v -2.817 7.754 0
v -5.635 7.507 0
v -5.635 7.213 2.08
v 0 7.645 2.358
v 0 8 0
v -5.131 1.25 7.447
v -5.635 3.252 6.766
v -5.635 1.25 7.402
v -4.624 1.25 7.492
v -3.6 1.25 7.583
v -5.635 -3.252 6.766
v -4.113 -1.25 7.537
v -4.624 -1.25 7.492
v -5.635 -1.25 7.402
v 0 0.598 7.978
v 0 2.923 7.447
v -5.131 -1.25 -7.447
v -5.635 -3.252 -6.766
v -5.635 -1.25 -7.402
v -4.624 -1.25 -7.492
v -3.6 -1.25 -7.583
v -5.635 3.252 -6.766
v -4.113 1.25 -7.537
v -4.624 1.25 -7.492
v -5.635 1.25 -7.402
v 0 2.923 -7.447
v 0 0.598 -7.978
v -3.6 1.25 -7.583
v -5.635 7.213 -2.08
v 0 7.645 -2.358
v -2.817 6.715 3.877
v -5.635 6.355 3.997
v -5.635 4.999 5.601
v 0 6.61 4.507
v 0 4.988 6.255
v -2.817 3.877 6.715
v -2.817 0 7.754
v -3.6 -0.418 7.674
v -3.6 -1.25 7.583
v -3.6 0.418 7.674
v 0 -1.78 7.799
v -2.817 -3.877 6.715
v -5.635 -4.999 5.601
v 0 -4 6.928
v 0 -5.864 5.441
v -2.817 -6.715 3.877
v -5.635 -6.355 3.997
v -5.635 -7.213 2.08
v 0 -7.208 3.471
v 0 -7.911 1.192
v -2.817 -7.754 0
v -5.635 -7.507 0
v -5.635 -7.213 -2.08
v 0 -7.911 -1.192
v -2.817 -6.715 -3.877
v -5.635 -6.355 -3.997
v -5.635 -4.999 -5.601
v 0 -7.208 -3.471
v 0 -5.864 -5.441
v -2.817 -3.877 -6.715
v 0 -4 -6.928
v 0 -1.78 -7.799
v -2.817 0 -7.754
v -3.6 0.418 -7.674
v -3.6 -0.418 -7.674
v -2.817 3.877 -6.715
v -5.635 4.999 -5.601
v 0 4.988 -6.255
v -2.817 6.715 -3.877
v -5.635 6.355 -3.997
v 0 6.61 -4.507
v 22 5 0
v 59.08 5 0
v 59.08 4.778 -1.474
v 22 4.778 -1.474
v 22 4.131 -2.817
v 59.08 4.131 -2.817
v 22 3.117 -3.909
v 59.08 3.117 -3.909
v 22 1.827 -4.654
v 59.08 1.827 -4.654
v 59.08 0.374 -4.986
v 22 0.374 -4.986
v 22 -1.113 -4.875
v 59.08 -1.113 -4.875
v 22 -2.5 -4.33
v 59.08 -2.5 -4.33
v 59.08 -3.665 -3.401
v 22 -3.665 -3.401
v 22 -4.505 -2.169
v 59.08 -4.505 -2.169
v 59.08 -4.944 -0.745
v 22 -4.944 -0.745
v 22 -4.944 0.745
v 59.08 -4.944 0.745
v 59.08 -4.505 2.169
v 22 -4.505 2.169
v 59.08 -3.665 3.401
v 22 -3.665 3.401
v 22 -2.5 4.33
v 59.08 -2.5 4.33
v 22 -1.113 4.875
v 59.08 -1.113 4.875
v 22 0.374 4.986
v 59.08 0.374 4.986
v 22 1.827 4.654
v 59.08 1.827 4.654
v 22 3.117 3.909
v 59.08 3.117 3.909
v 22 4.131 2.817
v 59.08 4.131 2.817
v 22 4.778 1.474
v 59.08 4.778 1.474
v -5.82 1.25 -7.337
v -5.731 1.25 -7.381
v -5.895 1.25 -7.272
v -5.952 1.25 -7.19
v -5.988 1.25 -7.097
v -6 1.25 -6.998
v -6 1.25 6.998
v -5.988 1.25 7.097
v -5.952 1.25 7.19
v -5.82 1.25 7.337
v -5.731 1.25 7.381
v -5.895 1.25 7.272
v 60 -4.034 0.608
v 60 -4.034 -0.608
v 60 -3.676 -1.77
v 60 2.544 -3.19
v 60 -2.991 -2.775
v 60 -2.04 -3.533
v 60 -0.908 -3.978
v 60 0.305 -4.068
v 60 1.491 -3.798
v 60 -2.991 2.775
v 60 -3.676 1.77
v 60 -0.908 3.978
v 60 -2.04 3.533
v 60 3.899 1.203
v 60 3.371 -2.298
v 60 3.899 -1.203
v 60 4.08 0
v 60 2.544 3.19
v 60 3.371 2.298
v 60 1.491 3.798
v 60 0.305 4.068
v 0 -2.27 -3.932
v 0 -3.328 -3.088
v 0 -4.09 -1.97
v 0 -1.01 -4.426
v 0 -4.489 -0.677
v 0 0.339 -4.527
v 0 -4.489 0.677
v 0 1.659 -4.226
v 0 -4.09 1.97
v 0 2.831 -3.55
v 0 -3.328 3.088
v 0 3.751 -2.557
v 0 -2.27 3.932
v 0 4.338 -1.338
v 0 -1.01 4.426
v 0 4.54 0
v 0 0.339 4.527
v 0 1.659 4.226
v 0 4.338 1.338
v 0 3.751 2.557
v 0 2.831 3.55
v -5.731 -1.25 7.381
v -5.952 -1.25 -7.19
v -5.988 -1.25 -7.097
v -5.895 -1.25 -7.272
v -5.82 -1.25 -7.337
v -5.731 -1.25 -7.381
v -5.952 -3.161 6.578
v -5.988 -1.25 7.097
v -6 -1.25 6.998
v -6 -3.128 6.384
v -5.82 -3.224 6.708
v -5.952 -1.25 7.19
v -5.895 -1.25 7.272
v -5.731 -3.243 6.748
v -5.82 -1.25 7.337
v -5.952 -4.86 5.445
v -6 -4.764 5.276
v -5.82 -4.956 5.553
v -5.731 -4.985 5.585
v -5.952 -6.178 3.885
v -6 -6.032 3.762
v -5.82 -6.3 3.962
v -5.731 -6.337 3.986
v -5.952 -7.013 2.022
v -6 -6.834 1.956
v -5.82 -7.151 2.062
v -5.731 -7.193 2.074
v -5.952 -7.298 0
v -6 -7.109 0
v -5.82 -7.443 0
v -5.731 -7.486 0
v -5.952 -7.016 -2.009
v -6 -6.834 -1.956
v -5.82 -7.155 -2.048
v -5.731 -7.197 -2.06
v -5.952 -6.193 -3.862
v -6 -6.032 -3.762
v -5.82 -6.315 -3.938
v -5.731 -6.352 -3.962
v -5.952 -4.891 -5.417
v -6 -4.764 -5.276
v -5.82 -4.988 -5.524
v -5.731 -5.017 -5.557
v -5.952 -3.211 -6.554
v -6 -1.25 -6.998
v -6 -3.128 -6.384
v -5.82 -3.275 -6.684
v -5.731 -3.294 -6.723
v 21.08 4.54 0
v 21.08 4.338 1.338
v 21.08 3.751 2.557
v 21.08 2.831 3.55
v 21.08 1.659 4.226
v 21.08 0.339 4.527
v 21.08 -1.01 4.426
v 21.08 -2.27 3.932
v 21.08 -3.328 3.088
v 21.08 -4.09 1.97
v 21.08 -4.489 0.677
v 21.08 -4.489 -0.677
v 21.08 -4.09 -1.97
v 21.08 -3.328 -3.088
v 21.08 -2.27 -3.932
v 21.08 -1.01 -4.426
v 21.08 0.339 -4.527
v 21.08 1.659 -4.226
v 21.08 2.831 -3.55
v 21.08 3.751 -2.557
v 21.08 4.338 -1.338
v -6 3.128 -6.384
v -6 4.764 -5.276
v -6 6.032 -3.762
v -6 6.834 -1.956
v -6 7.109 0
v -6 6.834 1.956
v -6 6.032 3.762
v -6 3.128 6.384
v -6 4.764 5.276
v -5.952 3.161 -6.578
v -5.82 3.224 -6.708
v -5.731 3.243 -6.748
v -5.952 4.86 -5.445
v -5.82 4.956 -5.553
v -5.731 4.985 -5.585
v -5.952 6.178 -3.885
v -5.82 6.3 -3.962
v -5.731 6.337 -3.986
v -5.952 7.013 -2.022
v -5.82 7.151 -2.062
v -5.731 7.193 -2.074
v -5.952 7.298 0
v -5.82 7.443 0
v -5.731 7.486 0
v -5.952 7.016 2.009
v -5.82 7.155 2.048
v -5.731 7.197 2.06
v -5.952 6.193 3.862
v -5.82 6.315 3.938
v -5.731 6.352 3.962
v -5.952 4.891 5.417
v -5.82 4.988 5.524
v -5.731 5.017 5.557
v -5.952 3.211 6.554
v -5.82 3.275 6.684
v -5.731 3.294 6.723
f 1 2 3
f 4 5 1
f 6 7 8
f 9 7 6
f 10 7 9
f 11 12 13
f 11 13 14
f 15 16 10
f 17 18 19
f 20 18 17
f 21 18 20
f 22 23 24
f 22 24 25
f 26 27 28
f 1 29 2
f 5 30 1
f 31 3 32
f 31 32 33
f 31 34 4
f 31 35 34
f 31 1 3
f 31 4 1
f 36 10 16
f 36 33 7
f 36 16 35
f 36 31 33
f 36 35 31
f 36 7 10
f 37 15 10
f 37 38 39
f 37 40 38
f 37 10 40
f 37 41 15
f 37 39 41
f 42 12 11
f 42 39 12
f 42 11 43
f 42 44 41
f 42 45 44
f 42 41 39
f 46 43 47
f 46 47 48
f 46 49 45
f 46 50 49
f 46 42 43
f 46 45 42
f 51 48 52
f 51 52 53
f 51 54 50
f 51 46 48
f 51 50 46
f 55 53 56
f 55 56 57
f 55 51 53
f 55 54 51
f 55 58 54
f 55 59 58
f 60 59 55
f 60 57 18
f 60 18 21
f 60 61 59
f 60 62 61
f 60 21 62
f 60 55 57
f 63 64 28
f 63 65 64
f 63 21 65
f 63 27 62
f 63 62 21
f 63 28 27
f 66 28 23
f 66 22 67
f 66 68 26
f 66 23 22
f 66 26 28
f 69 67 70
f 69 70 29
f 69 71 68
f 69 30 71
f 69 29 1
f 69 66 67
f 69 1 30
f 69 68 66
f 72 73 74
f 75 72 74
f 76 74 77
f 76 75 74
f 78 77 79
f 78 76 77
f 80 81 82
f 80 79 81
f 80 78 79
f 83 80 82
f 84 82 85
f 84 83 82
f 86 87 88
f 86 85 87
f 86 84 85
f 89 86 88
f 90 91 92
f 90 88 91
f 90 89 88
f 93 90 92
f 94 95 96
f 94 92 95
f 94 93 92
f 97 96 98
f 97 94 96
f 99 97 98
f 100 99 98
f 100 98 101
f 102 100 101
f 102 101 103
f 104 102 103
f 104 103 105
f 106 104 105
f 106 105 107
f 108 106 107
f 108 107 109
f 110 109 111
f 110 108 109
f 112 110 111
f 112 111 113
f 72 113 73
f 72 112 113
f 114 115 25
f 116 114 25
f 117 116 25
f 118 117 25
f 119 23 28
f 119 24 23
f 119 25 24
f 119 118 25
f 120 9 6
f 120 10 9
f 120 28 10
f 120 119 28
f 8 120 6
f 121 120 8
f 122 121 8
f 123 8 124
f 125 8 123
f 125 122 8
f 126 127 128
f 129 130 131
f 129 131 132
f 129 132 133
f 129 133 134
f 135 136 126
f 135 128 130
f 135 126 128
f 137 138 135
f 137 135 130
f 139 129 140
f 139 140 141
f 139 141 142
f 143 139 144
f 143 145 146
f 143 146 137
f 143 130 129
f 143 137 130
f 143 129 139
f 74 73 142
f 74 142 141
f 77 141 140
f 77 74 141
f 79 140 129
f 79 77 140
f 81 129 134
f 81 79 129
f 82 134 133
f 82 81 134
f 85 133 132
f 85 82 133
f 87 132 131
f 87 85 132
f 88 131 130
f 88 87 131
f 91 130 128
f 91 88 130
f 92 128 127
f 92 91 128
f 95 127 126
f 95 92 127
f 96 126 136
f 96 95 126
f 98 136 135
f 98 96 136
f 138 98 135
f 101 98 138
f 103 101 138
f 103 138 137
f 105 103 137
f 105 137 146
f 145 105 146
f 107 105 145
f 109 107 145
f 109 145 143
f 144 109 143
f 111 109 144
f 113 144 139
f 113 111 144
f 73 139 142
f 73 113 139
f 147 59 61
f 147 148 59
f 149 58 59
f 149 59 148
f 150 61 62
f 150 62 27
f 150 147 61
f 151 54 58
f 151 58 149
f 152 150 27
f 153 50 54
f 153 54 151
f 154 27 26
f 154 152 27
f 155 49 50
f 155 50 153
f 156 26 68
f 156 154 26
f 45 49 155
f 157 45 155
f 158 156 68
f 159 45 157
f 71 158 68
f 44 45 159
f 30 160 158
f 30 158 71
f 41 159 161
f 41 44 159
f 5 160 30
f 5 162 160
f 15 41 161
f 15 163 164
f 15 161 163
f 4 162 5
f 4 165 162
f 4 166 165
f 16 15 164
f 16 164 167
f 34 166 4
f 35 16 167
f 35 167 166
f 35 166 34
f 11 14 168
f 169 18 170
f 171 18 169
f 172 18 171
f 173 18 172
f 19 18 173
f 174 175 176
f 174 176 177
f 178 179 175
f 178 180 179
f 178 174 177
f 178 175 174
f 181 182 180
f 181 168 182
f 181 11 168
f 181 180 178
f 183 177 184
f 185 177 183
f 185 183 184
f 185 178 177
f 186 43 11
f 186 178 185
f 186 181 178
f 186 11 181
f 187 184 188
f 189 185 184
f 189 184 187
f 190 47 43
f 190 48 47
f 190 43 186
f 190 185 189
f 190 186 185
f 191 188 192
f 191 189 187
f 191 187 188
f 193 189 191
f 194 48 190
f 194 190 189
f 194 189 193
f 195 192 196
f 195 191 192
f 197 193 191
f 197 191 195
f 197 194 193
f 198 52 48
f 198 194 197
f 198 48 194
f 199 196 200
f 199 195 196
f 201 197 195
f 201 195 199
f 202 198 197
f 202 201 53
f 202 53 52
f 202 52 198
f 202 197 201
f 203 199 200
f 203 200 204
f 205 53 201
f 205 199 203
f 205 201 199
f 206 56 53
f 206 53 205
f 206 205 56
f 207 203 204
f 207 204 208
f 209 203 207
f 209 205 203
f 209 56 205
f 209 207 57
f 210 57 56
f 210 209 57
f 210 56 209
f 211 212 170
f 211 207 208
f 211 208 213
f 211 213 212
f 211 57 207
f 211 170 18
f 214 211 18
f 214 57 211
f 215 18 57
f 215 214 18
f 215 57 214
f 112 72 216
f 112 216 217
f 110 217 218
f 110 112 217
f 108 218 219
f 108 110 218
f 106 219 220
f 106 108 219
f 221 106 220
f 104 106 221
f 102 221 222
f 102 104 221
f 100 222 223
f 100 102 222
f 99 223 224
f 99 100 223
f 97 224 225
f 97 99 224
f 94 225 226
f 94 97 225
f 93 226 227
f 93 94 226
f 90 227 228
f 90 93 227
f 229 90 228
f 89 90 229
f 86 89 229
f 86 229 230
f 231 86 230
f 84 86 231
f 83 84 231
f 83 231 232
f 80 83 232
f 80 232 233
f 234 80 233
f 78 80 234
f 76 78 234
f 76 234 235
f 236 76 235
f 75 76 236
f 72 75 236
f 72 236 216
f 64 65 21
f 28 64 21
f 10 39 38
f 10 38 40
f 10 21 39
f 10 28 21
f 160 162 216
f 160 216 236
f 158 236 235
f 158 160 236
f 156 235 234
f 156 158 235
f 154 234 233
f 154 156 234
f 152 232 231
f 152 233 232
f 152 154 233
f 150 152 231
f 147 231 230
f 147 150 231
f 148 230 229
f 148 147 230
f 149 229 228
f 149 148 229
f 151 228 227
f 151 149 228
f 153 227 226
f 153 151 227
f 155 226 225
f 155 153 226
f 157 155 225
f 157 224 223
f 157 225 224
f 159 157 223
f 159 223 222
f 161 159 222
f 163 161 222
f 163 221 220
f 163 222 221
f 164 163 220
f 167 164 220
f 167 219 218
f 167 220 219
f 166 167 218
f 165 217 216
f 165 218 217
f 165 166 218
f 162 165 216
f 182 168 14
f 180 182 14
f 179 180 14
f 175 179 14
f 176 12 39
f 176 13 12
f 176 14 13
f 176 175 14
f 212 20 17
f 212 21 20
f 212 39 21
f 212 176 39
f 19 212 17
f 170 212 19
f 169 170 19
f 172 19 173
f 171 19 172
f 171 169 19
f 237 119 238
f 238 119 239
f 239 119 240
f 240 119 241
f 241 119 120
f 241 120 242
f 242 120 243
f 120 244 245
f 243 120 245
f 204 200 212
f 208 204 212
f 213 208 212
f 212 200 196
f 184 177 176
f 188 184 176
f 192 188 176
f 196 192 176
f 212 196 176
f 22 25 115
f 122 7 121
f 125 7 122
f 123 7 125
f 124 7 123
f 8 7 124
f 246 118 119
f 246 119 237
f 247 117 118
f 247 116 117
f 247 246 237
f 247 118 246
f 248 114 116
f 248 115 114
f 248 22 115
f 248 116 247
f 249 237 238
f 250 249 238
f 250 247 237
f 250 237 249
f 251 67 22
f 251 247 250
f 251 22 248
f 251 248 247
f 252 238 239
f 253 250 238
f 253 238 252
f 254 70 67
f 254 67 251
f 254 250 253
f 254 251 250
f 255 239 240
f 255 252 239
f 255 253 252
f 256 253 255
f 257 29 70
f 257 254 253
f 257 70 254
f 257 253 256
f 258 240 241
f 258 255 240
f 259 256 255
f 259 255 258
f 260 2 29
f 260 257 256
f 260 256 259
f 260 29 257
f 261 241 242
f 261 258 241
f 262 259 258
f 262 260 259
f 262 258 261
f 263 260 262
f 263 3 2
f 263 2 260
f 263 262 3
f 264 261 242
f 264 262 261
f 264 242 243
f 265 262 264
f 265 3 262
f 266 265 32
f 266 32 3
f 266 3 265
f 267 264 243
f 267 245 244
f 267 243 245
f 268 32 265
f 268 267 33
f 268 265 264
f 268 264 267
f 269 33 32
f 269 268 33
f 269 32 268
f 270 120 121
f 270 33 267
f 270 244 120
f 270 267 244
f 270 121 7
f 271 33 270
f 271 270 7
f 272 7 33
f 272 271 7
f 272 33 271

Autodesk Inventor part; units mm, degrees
ref_plane "YZ Plane" through (0, 0, 0) normal (1, 0, 0) x (0, 1, 0)
ref_plane "XZ Plane" through (0, 0, 0) normal (0, 1, 0) x (-1, 0, 0)
sketch "Sketch1" plane through (0, 0, 0) normal (0, 0, 1) x (1, 0, 0)
  line L0 (-6, 0) -> (60, 0)
  line L1 (60, 0) -> (60, 5)
  line L2 (60, 5) -> (22, 5)
  line L3 (22, 5) -> (21.0797, 4.54)
  line L4 (21.0797, 4.54) -> (0, 4.54)
  line L5 (0, 4.54) -> (0, 8)
  line L6 (-19.2, 0) -> (73.2, 0) projected
  line L7 (0, -1.6) -> (0, 9.6) projected
  line L8 (-6, 0) -> (-6, 7.4751)
  line L9 (0, 8) -> (-6, 7.4751)
  line L10 (22, 5) -> (0, 5) construction
  dimension "d0" = 60
  dimension "d1" = 38
  dimension "d2" = 0.9203
  dimension "d3" = 6
  dimension "d4" = 10
  dimension "d5" = 9.08
  dimension "d9" = 16
  dimension "d10" = 5
revolve "Body" add sketch "Sketch1" angle 360 about axis through (-6, 0, 0) along (1, 0, 0)
sketch "Sketch2" plane through (-6, 0, 0) normal (-1, 0, 0) x (0, 0, 1)
  circle A0 centre (0, 0) radius 8 projected
  line L0 (0, 0) -> (0, 7.4751) projected
  line L1 (-8, 1.25) -> (8, 1.25)
  line L2 (8, 1.25) -> (8, -1.25)
  line L3 (8, -1.25) -> (-8, -1.25)
  line L4 (-8, -1.25) -> (-8, 1.25)
  line L5 (-8, 0) -> (8, 0) construction
  line L6 (0, 1.25) -> (0, -1.25) construction
  dimension "d11" = 2.5
  dimension "d12" = 16
fillet "Fillet1" radius 0.4 1 edges at (-6, -7.4751, 0)
extrude "Slot" cut sketch "Sketch2" against normal blind 2.4 contours A0 L3 L1 | L2 L3 A0 | A0 L1 L2 | A0 L4 L1 | L3 L4 A0
thread "Thread" size "M10x1.5" class "6g" standard "ISO Metric profile" length 38
chamfer "Chamfer1" distance 0.9202 distance2 0.9203 1 edges at (60, -5, 0) measured on face at (60, -0.01, -0.88)
ref_plane "Work Plane1" through (30.1625, 0, 0) normal (0, 0, -1) x (1, 0, 0)
equation "\"d11\" = SBR"
equation "\"d12\" = KOD"
equation "\"d19\" = STI"
equation "\"d14\" = RR"
equation "\"d15\" = GEL"
equation "\"d17\" = -0.5 * SPD + 0.5 * GD"
equation "\"d0\" = NLG"
equation "\"d1\" = GEL"
equation "\"d3\" = KOH"
equation "\"d4\" = GD"
equation "\"d5\" = BDM"
equation "\"d9\" = KOD"
equation "\"d10\" = KEWI"
equation "\"GD\" = NND"
equation "\"NLG\" = 60"
equation "\"GEL\" = 38"
equation "\"KOD\" = 16"
equation "\"KOH\" = 6"
equation "\"GAL\" = 0.61345 * PTC"
equation "\"SPD\" = NND - 1.2269 * PTC"
equation "\"BDM\" = 9.08"
equation "\"GUL\" = 0.61345 * PTC"
equation "\"RR\" = 0.4"
equation "\"SBR\" = 2.5"
equation "\"STI\" = 2.4"
equation "\"KEWI\" = 5deg"
equation "\"PTC\" = 1.5"
equation "\"TOA\" = 30deg"
equation "\"GD1\" = THREADDIA - 1.2269 * PTC"
equation "\"NND\" = 10"
equation "\"THREADDIA\" = 10"
properties part number "ISO 1207 - M10 x 60" material "Stainless Steel, 440C"
